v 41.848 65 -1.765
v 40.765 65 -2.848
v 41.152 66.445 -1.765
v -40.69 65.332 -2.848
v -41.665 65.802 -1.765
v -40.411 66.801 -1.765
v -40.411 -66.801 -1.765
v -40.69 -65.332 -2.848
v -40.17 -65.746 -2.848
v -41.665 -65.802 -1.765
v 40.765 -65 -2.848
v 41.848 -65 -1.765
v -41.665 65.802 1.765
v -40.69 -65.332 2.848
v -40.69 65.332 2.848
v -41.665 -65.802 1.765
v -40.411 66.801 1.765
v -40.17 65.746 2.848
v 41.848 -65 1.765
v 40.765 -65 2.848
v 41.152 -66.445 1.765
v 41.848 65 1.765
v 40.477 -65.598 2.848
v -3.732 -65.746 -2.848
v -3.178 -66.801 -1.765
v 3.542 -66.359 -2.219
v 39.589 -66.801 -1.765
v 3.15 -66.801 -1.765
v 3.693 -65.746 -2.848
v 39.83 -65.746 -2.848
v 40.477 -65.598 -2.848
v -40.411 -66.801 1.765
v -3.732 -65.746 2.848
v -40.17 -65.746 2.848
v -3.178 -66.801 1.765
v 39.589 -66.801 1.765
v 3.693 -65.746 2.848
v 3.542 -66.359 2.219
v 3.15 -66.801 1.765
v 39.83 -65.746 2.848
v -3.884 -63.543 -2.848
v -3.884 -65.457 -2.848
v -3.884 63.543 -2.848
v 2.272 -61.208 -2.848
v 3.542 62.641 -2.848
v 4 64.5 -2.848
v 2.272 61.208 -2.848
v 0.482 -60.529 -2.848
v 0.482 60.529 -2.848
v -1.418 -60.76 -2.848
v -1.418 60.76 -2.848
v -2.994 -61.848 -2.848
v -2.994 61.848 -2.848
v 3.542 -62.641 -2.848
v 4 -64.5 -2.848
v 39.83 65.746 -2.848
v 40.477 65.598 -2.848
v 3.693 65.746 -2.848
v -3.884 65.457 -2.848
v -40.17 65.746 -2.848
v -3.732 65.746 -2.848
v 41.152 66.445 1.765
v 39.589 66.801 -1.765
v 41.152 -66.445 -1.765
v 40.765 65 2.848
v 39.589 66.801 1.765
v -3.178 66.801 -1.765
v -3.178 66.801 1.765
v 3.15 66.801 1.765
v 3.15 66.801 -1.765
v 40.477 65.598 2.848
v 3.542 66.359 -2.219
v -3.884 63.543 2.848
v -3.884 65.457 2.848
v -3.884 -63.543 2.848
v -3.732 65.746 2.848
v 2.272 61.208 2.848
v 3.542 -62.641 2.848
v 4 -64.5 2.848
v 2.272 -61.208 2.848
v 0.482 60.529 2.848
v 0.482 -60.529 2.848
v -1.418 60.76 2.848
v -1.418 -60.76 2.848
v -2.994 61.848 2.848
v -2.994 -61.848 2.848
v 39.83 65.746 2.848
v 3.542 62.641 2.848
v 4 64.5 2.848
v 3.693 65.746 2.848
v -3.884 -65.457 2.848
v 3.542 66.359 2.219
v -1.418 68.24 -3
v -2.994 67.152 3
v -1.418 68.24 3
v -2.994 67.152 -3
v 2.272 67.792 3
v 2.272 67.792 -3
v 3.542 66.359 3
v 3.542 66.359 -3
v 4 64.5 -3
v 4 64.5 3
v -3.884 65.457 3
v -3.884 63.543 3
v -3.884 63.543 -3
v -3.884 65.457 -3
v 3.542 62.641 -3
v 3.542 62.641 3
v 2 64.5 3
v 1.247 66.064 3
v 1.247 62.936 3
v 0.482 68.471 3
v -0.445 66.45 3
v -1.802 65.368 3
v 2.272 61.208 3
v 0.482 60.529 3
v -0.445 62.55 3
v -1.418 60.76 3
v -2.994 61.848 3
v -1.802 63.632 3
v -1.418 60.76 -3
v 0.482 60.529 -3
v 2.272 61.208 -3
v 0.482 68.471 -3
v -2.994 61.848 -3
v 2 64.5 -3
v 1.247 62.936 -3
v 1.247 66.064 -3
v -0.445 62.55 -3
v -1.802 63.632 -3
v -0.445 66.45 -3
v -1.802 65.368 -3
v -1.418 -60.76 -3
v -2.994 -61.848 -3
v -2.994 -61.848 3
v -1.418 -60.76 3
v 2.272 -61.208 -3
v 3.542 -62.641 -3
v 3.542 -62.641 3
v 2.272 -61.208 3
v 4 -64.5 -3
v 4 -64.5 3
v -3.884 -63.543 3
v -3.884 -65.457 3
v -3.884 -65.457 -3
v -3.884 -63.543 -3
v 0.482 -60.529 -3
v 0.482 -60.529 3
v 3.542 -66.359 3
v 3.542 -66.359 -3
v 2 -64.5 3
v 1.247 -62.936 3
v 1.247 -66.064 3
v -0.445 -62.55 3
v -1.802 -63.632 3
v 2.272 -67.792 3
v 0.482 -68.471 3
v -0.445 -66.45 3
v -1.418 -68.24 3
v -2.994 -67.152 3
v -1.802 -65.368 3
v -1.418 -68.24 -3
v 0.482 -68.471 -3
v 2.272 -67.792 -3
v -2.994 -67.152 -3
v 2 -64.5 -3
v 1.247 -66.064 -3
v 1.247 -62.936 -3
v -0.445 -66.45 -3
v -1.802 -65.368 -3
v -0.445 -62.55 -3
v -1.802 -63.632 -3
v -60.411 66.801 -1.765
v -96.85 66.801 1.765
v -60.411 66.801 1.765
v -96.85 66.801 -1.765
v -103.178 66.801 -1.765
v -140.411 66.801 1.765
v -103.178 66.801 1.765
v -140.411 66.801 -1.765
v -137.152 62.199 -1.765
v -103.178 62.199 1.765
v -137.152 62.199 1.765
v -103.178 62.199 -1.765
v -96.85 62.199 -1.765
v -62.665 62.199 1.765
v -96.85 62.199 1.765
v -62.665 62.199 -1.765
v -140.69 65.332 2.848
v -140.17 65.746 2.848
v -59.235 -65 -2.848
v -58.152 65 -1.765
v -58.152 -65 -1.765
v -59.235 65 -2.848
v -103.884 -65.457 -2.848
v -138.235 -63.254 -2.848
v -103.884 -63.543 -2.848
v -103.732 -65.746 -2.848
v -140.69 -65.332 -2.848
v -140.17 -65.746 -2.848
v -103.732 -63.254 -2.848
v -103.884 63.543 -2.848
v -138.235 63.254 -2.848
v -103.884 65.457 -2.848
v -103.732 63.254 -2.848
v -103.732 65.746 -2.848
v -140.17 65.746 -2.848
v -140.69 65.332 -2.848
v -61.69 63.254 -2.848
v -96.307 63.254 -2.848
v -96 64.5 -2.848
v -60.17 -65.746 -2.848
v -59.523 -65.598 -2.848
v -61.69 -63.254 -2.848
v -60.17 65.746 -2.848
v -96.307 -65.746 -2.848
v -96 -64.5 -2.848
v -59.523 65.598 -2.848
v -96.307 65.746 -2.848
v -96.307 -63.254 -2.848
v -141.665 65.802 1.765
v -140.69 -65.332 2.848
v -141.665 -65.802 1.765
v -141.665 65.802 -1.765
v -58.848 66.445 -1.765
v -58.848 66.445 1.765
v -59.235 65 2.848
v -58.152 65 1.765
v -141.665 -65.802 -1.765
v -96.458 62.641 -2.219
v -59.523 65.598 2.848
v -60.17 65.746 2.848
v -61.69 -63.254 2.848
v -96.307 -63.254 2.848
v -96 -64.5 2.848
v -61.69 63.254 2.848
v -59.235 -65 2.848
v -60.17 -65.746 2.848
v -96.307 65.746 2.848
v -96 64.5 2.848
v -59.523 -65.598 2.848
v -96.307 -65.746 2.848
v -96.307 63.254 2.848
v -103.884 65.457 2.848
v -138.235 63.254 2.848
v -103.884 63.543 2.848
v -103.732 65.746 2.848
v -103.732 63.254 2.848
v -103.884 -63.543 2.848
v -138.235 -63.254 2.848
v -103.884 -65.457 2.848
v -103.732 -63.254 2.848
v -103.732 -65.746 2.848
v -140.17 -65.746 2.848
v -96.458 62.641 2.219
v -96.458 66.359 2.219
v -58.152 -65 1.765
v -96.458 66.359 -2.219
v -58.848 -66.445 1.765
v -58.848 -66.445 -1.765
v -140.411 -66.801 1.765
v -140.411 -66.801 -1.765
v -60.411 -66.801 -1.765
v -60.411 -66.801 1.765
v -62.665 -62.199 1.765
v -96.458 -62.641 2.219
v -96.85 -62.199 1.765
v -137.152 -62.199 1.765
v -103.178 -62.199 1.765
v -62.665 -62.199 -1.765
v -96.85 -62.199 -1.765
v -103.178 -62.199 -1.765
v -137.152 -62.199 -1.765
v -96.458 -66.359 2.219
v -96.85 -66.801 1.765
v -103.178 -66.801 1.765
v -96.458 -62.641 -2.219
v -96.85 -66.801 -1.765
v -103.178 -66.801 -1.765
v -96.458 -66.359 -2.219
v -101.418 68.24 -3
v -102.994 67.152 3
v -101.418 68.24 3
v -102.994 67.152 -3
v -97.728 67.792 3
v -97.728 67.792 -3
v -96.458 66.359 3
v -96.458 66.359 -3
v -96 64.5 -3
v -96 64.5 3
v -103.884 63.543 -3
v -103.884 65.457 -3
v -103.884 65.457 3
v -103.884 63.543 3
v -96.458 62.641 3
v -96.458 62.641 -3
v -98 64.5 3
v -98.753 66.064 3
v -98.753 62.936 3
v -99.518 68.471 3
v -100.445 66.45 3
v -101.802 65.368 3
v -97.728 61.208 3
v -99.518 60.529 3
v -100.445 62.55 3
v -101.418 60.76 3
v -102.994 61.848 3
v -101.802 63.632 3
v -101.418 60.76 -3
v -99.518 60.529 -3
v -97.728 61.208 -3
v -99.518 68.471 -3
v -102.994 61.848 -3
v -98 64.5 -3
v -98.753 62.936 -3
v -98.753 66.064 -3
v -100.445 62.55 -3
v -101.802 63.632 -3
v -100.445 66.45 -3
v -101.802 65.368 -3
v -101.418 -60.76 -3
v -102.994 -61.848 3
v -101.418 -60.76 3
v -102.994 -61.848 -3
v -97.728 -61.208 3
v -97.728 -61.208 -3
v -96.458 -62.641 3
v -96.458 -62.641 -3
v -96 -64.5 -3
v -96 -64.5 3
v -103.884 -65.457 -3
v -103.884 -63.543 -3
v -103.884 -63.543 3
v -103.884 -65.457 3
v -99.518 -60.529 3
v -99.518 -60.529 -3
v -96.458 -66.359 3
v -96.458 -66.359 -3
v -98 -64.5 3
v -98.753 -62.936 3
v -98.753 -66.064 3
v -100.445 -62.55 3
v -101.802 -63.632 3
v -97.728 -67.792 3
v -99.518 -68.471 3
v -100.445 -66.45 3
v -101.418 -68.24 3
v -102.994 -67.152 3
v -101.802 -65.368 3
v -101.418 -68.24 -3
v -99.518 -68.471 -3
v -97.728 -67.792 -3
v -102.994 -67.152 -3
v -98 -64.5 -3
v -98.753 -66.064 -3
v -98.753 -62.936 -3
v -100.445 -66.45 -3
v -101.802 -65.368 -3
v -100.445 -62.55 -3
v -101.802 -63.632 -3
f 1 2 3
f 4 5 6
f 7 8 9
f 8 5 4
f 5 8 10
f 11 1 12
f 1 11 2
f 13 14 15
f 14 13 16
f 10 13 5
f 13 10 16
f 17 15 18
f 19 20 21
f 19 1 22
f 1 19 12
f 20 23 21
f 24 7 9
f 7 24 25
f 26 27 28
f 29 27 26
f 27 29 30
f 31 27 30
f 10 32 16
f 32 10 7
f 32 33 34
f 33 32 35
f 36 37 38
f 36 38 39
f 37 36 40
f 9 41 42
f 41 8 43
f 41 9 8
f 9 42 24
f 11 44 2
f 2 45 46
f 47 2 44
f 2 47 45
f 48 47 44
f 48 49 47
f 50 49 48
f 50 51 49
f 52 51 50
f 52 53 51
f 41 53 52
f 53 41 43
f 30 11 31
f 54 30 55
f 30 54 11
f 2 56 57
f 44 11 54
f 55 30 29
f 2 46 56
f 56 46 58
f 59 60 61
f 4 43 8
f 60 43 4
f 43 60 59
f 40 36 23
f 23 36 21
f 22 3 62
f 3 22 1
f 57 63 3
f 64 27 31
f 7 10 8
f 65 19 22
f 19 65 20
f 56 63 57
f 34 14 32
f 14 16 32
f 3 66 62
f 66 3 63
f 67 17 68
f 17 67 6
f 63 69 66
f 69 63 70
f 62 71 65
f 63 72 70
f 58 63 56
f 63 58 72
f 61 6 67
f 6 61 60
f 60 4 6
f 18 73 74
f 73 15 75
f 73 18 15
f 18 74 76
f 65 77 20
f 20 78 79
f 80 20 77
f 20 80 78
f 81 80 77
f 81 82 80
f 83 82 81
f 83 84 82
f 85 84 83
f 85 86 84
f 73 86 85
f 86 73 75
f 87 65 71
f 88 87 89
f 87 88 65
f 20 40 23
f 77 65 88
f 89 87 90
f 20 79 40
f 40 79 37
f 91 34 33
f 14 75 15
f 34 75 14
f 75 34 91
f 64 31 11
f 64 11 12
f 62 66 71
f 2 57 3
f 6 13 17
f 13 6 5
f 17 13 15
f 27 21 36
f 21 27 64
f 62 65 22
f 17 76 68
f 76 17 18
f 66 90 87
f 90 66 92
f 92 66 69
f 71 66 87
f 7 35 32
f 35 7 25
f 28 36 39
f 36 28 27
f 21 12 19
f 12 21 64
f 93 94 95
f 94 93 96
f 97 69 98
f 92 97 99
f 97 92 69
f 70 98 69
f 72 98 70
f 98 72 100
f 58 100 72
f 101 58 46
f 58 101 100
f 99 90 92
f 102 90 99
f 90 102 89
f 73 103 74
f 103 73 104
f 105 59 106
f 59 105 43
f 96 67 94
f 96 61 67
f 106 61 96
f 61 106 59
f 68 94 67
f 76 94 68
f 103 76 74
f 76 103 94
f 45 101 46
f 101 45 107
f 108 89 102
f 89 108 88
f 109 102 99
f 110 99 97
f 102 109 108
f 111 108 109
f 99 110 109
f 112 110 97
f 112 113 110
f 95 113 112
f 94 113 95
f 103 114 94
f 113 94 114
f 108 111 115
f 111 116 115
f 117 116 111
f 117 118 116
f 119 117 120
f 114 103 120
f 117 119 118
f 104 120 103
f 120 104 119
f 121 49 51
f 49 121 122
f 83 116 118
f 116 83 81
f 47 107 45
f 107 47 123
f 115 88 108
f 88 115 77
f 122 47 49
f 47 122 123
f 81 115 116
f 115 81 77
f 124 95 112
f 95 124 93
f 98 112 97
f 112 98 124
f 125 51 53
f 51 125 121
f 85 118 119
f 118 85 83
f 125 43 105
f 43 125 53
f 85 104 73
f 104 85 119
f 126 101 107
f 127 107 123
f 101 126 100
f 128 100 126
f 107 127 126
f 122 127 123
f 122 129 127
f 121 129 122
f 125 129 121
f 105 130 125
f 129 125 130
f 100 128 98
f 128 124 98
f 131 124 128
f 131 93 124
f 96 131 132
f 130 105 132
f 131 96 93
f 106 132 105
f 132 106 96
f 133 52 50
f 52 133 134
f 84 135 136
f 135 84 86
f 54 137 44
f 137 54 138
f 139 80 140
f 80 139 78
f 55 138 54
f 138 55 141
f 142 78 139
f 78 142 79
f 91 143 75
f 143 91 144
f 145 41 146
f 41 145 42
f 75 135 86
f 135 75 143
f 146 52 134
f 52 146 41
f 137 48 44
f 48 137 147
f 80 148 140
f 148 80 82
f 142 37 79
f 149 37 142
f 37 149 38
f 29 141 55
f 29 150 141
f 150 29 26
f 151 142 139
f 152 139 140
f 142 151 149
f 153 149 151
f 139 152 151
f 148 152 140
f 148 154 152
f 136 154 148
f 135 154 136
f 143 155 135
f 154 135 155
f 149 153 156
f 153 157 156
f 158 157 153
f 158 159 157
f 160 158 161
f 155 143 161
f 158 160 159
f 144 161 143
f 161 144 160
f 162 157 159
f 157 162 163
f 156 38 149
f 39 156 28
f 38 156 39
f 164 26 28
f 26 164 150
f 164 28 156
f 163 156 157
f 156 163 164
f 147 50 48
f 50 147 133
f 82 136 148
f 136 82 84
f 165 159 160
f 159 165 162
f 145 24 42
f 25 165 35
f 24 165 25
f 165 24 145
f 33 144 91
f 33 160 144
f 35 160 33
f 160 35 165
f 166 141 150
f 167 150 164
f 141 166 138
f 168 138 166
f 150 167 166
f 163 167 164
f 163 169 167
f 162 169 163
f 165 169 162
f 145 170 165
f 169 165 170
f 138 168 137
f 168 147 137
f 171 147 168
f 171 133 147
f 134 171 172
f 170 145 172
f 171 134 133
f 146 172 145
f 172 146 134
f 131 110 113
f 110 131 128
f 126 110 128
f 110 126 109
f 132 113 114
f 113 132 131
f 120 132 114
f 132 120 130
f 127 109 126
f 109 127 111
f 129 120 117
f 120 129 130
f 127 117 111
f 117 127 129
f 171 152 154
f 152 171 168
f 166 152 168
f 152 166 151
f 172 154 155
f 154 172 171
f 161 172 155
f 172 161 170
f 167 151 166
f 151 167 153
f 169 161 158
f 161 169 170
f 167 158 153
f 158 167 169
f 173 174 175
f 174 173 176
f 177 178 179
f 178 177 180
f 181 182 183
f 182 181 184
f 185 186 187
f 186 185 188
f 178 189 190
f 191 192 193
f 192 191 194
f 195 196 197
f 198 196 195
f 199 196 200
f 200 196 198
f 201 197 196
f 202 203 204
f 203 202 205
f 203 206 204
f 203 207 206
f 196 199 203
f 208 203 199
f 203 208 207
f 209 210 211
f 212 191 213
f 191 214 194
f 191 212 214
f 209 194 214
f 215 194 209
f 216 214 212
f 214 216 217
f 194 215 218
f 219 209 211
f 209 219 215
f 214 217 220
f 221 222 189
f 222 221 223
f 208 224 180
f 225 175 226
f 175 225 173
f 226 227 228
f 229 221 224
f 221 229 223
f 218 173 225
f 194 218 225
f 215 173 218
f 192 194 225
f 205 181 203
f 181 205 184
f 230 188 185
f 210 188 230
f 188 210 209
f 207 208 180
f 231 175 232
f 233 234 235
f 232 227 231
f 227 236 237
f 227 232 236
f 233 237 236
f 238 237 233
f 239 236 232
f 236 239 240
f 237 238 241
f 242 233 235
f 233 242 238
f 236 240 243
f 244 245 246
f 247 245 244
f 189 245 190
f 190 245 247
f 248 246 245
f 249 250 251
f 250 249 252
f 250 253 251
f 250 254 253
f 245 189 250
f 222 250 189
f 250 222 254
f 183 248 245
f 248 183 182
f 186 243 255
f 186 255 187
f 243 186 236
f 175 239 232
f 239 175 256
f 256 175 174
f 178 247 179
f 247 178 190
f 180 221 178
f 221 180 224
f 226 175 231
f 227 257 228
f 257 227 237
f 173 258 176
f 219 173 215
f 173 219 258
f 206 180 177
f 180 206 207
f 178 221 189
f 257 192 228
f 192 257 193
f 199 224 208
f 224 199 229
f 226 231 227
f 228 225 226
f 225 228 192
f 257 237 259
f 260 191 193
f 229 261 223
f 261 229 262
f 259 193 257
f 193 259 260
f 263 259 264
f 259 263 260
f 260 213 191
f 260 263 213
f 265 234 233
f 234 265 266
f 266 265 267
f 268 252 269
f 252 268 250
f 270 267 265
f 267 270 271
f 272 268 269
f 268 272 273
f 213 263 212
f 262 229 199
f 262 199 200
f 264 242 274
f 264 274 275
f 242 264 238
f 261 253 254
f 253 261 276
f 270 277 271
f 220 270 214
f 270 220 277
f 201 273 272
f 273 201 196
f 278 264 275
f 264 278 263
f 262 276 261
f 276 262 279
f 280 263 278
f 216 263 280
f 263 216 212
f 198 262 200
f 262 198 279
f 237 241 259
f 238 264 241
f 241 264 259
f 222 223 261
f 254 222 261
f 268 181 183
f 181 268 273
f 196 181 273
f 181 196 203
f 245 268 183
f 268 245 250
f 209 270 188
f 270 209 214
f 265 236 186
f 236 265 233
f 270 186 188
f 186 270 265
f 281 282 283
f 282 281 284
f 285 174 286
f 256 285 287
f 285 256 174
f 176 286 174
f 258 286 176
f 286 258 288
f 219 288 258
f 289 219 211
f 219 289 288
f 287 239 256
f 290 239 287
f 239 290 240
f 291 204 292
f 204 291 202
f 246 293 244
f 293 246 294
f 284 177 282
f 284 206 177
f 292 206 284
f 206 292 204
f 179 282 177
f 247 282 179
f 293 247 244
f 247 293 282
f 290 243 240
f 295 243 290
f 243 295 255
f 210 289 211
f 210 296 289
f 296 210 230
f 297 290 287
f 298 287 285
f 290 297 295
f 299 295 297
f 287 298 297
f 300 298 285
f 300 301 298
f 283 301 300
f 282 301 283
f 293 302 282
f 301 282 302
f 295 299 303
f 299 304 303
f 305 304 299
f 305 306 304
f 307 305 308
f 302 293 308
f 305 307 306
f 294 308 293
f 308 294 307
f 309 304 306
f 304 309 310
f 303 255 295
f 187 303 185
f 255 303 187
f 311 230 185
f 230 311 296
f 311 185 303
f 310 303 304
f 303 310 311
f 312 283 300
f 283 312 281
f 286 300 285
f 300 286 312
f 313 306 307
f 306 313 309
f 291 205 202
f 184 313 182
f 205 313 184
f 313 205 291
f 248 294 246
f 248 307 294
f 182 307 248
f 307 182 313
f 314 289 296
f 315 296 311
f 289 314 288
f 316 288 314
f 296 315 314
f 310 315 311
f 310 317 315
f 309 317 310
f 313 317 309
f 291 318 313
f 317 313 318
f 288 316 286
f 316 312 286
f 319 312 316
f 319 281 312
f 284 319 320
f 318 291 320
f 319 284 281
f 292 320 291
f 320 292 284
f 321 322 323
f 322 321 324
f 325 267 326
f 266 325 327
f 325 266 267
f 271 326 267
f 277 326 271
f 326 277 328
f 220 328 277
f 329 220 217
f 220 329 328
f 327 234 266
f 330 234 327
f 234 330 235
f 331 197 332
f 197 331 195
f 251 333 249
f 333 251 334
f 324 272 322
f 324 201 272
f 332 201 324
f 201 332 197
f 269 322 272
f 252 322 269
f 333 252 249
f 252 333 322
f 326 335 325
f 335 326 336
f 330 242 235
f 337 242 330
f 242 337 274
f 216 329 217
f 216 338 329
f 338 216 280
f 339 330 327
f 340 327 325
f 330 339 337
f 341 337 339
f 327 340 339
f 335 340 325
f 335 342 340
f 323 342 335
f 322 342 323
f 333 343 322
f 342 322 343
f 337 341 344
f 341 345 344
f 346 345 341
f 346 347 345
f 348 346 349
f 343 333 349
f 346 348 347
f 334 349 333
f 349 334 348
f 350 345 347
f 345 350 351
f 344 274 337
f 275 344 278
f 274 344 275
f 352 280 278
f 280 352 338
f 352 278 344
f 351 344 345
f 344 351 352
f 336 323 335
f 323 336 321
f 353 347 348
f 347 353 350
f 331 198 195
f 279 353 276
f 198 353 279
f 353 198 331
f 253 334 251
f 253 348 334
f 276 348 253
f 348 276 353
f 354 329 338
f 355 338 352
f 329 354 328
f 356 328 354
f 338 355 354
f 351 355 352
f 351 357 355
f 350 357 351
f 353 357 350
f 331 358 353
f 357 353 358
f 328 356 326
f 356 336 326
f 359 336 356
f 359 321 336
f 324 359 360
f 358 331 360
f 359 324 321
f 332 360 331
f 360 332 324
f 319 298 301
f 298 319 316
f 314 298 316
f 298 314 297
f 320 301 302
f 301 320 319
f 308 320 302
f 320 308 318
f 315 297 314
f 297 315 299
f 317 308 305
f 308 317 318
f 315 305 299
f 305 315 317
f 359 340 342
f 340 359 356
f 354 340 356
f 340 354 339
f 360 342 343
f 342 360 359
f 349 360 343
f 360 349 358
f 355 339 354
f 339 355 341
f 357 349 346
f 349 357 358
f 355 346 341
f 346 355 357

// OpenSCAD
rd = 2;
wd = 80;
lt = 130;
ht = 2;



difference(){
    union(){
        minkowski(){
        cube([wd,lt,ht], center=true);
        sphere(r=rd);
        }
        translate([0,lt/2 - ht/4,0 ])
        cylinder(r=rd*2,h=ht+rd*2, center=true);
        translate([0,-lt/2 +ht/4,0 ])
        cylinder(r=rd*2,h=ht+rd*2, center=true);
    
    }
    translate([0,lt/2 - ht/4,0 ])
    cylinder(d=rd*2,h=ht+rd*2, center=true);
    translate([0,-lt/2 +ht/4,0 ])
    cylinder(d=rd*2,h=ht+rd*2, center=true);
}

translate([-wd - 20,0,0]) {
    difference(){
            union(){
                minkowski(){
                    difference(){
                    cube([wd,lt,ht], center=true);
                    cube([wd-ht,lt-ht,ht], center=true);
                    }
                sphere(r=rd);
            }
            translate([0,lt/2 - ht/4,0 ])
            cylinder(r=rd*2,h=ht+rd*2, center=true);
            translate([0,-lt/2 +ht/4,0 ])
            cylinder(r=rd*2,h=ht+rd*2, center=true);
        }
        translate([0,lt/2 - ht/4,0 ])
        #cylinder(d=rd*2,h=ht+rd*2, center=true);
        translate([0,-lt/2 +ht/4,0 ])
        #cylinder(d=rd*2,h=ht+rd*2, center=true);
    }
}
